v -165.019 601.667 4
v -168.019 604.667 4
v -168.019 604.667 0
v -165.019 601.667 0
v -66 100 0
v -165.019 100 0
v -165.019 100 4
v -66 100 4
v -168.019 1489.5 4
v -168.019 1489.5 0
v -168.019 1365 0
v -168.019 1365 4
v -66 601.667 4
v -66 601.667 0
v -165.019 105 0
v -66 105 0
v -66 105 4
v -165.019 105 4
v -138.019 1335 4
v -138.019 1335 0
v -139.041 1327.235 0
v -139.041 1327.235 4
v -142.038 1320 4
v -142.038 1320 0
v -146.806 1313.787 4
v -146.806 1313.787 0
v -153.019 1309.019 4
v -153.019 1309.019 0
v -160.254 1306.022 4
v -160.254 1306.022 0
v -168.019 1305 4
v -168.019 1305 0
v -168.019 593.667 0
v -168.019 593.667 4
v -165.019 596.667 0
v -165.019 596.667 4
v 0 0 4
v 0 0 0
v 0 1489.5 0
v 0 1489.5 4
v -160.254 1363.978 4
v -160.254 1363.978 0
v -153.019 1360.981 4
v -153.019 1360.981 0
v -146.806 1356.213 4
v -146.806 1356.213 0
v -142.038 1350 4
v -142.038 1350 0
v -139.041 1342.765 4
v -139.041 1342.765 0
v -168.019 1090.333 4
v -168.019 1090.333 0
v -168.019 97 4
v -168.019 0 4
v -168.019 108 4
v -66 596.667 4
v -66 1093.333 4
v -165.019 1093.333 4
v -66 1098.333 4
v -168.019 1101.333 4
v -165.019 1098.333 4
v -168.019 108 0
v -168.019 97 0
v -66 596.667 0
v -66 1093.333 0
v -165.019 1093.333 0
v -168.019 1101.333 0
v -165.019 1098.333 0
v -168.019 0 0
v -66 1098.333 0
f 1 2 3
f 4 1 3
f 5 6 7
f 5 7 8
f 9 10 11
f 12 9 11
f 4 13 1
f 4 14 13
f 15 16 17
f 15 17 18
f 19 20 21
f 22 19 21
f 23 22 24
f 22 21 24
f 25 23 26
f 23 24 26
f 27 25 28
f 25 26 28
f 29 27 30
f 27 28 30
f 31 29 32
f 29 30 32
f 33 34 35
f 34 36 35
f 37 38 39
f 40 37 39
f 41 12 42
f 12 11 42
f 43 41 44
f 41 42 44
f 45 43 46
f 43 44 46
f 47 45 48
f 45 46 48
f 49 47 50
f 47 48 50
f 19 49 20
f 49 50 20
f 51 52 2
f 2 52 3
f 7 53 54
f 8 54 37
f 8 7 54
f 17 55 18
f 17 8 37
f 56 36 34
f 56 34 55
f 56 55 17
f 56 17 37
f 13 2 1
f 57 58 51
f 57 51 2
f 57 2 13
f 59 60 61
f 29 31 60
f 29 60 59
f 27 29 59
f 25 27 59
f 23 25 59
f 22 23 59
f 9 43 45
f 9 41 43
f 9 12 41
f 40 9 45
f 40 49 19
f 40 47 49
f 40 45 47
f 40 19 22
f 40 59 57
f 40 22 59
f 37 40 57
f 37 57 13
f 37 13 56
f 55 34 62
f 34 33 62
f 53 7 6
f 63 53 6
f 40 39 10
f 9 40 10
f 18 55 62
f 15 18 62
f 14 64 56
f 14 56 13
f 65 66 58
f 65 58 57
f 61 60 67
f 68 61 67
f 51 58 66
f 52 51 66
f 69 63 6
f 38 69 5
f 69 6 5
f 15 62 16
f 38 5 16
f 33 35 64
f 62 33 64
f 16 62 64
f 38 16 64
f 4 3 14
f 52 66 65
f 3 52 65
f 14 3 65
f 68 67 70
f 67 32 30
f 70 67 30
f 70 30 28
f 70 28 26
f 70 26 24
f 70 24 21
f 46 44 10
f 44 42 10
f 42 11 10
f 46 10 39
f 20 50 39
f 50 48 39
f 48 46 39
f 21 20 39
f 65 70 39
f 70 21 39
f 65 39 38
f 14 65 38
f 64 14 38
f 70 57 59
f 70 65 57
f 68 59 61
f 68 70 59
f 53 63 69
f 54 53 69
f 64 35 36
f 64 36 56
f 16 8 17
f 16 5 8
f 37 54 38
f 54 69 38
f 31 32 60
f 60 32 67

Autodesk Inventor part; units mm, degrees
ref_plane "YZ Plane" through (0, 0, 0) normal (1, 0, 0) x (0, 1, 0)
ref_plane "XZ Plane" through (0, 0, 0) normal (0, 1, 0) x (-1, 0, 0)
ref_plane "XY Plane" through (0, 0, 0) normal (0, 0, 1) x (1, 0, 0)
sketch "Sketch1" plane through (0, 0, 0) normal (0, 0, 1) x (1, 0, 0)
  line L0 (0, 1489.5) -> (-168.019, 1489.5)
  line L1 (-168.019, 1489.5) -> (-168.019, 0)
  line L2 (-168.019, 0) -> (0, 0)
  line L3 (0, 0) -> (0, 1489.5)
  line L4 (-168.019, 100) -> (-66, 100)
  line L5 (-66, 100) -> (-66, 105)
  line L6 (-66, 105) -> (-168.019, 105)
  line L7 (-168.019, 105) -> (-168.019, 100)
  line L8 (-168.019, 596.6667) -> (-66, 596.6667)
  line L9 (-66, 596.6667) -> (-66, 601.6667)
  line L10 (-66, 601.6667) -> (-168.019, 601.6667)
  line L11 (-168.019, 601.6667) -> (-168.019, 596.6667)
  line L12 (-168.019, 1093.3333) -> (-66, 1093.3333)
  line L13 (-66, 1093.3333) -> (-66, 1098.3333)
  line L14 (-66, 1098.3333) -> (-168.019, 1098.3333)
  line L15 (-168.019, 1098.3333) -> (-168.019, 1093.3333)
  circle A0 centre (-168.019, 1335) radius 30
  point P0 (-168.019, 1098.3333)
  point P1 (-168.019, 1093.3333)
  point P2 (-168.019, 596.6667)
  point P3 (-168.019, 1365)
  point P4 (-168.019, 1305)
  dimension "d0" = 1489.5
  dimension "d1" = 168.019
  dimension "d2" = 5
  dimension "d4" = 100
  dimension "d7" = 496.6667
  dimension "d23" = 66
  dimension "d29" = 60
  dimension "d30" = 1335
extrude "Plate1" add sketch "Sketch1" along normal blind 4 contours L3 L2 L1 L4 L5 L6 L8 L9 L10 L12 L13 L14 A0 L0
chamfer "Corner Chamfer1" distance 3 angle 45 6 edges at (-168.019, 100, 2) (-168.019, 105, 2) (-168.019, 596.6667, 2) (-168.019, 601.6667, 2) (-168.019, 1098.3333, 2) (-168.019, 1093.3333, 2)
equation "\"d0\" = Стрингер_длина"
equation "\"d1\" = стрингер_глубина_3"
equation "\"d2\" = паз_под_стрингер_толщина"
equation "\"d7\" = Шаг_шпангоутов"
equation "\"d23\" = паз_под_стрингер_глубина - Thickness"
equation "\"d29\" = 2 * радиус_выреза_под_сварку"
equation "\"d12\" = Thickness"
equation "\"BendRadius\" = Thickness"
equation "\"BendReliefWidth\" = Thickness"
equation "\"BendReliefDepth\" = 0.5 * Thickness"
equation "\"CornerReliefSize\" = 4 * Thickness"
equation "\"MinimumRemnant\" = 2 * Thickness"
equation "\"TransitionRadius\" = BendRadius"
equation "\"JacobiRadiusSize\" = BendRadius"
equation "\"GapSize\" = Thickness"
equation "\"Стрингер_длина\" = 1489.5"
equation "\"стрингер_глубина_3\" = 168.018988"
equation "\"паз_под_стрингер_толщина\" = 5"
equation "\"Шаг_шпангоутов\" = 496.666667"
equation "\"паз_под_стрингер_глубина\" = 70"
equation "\"Thickness\" = 4"
equation "\"радиус_выреза_под_сварку\" = 30"
properties part number "GBK 3115 stringer 3" material "Steel"
